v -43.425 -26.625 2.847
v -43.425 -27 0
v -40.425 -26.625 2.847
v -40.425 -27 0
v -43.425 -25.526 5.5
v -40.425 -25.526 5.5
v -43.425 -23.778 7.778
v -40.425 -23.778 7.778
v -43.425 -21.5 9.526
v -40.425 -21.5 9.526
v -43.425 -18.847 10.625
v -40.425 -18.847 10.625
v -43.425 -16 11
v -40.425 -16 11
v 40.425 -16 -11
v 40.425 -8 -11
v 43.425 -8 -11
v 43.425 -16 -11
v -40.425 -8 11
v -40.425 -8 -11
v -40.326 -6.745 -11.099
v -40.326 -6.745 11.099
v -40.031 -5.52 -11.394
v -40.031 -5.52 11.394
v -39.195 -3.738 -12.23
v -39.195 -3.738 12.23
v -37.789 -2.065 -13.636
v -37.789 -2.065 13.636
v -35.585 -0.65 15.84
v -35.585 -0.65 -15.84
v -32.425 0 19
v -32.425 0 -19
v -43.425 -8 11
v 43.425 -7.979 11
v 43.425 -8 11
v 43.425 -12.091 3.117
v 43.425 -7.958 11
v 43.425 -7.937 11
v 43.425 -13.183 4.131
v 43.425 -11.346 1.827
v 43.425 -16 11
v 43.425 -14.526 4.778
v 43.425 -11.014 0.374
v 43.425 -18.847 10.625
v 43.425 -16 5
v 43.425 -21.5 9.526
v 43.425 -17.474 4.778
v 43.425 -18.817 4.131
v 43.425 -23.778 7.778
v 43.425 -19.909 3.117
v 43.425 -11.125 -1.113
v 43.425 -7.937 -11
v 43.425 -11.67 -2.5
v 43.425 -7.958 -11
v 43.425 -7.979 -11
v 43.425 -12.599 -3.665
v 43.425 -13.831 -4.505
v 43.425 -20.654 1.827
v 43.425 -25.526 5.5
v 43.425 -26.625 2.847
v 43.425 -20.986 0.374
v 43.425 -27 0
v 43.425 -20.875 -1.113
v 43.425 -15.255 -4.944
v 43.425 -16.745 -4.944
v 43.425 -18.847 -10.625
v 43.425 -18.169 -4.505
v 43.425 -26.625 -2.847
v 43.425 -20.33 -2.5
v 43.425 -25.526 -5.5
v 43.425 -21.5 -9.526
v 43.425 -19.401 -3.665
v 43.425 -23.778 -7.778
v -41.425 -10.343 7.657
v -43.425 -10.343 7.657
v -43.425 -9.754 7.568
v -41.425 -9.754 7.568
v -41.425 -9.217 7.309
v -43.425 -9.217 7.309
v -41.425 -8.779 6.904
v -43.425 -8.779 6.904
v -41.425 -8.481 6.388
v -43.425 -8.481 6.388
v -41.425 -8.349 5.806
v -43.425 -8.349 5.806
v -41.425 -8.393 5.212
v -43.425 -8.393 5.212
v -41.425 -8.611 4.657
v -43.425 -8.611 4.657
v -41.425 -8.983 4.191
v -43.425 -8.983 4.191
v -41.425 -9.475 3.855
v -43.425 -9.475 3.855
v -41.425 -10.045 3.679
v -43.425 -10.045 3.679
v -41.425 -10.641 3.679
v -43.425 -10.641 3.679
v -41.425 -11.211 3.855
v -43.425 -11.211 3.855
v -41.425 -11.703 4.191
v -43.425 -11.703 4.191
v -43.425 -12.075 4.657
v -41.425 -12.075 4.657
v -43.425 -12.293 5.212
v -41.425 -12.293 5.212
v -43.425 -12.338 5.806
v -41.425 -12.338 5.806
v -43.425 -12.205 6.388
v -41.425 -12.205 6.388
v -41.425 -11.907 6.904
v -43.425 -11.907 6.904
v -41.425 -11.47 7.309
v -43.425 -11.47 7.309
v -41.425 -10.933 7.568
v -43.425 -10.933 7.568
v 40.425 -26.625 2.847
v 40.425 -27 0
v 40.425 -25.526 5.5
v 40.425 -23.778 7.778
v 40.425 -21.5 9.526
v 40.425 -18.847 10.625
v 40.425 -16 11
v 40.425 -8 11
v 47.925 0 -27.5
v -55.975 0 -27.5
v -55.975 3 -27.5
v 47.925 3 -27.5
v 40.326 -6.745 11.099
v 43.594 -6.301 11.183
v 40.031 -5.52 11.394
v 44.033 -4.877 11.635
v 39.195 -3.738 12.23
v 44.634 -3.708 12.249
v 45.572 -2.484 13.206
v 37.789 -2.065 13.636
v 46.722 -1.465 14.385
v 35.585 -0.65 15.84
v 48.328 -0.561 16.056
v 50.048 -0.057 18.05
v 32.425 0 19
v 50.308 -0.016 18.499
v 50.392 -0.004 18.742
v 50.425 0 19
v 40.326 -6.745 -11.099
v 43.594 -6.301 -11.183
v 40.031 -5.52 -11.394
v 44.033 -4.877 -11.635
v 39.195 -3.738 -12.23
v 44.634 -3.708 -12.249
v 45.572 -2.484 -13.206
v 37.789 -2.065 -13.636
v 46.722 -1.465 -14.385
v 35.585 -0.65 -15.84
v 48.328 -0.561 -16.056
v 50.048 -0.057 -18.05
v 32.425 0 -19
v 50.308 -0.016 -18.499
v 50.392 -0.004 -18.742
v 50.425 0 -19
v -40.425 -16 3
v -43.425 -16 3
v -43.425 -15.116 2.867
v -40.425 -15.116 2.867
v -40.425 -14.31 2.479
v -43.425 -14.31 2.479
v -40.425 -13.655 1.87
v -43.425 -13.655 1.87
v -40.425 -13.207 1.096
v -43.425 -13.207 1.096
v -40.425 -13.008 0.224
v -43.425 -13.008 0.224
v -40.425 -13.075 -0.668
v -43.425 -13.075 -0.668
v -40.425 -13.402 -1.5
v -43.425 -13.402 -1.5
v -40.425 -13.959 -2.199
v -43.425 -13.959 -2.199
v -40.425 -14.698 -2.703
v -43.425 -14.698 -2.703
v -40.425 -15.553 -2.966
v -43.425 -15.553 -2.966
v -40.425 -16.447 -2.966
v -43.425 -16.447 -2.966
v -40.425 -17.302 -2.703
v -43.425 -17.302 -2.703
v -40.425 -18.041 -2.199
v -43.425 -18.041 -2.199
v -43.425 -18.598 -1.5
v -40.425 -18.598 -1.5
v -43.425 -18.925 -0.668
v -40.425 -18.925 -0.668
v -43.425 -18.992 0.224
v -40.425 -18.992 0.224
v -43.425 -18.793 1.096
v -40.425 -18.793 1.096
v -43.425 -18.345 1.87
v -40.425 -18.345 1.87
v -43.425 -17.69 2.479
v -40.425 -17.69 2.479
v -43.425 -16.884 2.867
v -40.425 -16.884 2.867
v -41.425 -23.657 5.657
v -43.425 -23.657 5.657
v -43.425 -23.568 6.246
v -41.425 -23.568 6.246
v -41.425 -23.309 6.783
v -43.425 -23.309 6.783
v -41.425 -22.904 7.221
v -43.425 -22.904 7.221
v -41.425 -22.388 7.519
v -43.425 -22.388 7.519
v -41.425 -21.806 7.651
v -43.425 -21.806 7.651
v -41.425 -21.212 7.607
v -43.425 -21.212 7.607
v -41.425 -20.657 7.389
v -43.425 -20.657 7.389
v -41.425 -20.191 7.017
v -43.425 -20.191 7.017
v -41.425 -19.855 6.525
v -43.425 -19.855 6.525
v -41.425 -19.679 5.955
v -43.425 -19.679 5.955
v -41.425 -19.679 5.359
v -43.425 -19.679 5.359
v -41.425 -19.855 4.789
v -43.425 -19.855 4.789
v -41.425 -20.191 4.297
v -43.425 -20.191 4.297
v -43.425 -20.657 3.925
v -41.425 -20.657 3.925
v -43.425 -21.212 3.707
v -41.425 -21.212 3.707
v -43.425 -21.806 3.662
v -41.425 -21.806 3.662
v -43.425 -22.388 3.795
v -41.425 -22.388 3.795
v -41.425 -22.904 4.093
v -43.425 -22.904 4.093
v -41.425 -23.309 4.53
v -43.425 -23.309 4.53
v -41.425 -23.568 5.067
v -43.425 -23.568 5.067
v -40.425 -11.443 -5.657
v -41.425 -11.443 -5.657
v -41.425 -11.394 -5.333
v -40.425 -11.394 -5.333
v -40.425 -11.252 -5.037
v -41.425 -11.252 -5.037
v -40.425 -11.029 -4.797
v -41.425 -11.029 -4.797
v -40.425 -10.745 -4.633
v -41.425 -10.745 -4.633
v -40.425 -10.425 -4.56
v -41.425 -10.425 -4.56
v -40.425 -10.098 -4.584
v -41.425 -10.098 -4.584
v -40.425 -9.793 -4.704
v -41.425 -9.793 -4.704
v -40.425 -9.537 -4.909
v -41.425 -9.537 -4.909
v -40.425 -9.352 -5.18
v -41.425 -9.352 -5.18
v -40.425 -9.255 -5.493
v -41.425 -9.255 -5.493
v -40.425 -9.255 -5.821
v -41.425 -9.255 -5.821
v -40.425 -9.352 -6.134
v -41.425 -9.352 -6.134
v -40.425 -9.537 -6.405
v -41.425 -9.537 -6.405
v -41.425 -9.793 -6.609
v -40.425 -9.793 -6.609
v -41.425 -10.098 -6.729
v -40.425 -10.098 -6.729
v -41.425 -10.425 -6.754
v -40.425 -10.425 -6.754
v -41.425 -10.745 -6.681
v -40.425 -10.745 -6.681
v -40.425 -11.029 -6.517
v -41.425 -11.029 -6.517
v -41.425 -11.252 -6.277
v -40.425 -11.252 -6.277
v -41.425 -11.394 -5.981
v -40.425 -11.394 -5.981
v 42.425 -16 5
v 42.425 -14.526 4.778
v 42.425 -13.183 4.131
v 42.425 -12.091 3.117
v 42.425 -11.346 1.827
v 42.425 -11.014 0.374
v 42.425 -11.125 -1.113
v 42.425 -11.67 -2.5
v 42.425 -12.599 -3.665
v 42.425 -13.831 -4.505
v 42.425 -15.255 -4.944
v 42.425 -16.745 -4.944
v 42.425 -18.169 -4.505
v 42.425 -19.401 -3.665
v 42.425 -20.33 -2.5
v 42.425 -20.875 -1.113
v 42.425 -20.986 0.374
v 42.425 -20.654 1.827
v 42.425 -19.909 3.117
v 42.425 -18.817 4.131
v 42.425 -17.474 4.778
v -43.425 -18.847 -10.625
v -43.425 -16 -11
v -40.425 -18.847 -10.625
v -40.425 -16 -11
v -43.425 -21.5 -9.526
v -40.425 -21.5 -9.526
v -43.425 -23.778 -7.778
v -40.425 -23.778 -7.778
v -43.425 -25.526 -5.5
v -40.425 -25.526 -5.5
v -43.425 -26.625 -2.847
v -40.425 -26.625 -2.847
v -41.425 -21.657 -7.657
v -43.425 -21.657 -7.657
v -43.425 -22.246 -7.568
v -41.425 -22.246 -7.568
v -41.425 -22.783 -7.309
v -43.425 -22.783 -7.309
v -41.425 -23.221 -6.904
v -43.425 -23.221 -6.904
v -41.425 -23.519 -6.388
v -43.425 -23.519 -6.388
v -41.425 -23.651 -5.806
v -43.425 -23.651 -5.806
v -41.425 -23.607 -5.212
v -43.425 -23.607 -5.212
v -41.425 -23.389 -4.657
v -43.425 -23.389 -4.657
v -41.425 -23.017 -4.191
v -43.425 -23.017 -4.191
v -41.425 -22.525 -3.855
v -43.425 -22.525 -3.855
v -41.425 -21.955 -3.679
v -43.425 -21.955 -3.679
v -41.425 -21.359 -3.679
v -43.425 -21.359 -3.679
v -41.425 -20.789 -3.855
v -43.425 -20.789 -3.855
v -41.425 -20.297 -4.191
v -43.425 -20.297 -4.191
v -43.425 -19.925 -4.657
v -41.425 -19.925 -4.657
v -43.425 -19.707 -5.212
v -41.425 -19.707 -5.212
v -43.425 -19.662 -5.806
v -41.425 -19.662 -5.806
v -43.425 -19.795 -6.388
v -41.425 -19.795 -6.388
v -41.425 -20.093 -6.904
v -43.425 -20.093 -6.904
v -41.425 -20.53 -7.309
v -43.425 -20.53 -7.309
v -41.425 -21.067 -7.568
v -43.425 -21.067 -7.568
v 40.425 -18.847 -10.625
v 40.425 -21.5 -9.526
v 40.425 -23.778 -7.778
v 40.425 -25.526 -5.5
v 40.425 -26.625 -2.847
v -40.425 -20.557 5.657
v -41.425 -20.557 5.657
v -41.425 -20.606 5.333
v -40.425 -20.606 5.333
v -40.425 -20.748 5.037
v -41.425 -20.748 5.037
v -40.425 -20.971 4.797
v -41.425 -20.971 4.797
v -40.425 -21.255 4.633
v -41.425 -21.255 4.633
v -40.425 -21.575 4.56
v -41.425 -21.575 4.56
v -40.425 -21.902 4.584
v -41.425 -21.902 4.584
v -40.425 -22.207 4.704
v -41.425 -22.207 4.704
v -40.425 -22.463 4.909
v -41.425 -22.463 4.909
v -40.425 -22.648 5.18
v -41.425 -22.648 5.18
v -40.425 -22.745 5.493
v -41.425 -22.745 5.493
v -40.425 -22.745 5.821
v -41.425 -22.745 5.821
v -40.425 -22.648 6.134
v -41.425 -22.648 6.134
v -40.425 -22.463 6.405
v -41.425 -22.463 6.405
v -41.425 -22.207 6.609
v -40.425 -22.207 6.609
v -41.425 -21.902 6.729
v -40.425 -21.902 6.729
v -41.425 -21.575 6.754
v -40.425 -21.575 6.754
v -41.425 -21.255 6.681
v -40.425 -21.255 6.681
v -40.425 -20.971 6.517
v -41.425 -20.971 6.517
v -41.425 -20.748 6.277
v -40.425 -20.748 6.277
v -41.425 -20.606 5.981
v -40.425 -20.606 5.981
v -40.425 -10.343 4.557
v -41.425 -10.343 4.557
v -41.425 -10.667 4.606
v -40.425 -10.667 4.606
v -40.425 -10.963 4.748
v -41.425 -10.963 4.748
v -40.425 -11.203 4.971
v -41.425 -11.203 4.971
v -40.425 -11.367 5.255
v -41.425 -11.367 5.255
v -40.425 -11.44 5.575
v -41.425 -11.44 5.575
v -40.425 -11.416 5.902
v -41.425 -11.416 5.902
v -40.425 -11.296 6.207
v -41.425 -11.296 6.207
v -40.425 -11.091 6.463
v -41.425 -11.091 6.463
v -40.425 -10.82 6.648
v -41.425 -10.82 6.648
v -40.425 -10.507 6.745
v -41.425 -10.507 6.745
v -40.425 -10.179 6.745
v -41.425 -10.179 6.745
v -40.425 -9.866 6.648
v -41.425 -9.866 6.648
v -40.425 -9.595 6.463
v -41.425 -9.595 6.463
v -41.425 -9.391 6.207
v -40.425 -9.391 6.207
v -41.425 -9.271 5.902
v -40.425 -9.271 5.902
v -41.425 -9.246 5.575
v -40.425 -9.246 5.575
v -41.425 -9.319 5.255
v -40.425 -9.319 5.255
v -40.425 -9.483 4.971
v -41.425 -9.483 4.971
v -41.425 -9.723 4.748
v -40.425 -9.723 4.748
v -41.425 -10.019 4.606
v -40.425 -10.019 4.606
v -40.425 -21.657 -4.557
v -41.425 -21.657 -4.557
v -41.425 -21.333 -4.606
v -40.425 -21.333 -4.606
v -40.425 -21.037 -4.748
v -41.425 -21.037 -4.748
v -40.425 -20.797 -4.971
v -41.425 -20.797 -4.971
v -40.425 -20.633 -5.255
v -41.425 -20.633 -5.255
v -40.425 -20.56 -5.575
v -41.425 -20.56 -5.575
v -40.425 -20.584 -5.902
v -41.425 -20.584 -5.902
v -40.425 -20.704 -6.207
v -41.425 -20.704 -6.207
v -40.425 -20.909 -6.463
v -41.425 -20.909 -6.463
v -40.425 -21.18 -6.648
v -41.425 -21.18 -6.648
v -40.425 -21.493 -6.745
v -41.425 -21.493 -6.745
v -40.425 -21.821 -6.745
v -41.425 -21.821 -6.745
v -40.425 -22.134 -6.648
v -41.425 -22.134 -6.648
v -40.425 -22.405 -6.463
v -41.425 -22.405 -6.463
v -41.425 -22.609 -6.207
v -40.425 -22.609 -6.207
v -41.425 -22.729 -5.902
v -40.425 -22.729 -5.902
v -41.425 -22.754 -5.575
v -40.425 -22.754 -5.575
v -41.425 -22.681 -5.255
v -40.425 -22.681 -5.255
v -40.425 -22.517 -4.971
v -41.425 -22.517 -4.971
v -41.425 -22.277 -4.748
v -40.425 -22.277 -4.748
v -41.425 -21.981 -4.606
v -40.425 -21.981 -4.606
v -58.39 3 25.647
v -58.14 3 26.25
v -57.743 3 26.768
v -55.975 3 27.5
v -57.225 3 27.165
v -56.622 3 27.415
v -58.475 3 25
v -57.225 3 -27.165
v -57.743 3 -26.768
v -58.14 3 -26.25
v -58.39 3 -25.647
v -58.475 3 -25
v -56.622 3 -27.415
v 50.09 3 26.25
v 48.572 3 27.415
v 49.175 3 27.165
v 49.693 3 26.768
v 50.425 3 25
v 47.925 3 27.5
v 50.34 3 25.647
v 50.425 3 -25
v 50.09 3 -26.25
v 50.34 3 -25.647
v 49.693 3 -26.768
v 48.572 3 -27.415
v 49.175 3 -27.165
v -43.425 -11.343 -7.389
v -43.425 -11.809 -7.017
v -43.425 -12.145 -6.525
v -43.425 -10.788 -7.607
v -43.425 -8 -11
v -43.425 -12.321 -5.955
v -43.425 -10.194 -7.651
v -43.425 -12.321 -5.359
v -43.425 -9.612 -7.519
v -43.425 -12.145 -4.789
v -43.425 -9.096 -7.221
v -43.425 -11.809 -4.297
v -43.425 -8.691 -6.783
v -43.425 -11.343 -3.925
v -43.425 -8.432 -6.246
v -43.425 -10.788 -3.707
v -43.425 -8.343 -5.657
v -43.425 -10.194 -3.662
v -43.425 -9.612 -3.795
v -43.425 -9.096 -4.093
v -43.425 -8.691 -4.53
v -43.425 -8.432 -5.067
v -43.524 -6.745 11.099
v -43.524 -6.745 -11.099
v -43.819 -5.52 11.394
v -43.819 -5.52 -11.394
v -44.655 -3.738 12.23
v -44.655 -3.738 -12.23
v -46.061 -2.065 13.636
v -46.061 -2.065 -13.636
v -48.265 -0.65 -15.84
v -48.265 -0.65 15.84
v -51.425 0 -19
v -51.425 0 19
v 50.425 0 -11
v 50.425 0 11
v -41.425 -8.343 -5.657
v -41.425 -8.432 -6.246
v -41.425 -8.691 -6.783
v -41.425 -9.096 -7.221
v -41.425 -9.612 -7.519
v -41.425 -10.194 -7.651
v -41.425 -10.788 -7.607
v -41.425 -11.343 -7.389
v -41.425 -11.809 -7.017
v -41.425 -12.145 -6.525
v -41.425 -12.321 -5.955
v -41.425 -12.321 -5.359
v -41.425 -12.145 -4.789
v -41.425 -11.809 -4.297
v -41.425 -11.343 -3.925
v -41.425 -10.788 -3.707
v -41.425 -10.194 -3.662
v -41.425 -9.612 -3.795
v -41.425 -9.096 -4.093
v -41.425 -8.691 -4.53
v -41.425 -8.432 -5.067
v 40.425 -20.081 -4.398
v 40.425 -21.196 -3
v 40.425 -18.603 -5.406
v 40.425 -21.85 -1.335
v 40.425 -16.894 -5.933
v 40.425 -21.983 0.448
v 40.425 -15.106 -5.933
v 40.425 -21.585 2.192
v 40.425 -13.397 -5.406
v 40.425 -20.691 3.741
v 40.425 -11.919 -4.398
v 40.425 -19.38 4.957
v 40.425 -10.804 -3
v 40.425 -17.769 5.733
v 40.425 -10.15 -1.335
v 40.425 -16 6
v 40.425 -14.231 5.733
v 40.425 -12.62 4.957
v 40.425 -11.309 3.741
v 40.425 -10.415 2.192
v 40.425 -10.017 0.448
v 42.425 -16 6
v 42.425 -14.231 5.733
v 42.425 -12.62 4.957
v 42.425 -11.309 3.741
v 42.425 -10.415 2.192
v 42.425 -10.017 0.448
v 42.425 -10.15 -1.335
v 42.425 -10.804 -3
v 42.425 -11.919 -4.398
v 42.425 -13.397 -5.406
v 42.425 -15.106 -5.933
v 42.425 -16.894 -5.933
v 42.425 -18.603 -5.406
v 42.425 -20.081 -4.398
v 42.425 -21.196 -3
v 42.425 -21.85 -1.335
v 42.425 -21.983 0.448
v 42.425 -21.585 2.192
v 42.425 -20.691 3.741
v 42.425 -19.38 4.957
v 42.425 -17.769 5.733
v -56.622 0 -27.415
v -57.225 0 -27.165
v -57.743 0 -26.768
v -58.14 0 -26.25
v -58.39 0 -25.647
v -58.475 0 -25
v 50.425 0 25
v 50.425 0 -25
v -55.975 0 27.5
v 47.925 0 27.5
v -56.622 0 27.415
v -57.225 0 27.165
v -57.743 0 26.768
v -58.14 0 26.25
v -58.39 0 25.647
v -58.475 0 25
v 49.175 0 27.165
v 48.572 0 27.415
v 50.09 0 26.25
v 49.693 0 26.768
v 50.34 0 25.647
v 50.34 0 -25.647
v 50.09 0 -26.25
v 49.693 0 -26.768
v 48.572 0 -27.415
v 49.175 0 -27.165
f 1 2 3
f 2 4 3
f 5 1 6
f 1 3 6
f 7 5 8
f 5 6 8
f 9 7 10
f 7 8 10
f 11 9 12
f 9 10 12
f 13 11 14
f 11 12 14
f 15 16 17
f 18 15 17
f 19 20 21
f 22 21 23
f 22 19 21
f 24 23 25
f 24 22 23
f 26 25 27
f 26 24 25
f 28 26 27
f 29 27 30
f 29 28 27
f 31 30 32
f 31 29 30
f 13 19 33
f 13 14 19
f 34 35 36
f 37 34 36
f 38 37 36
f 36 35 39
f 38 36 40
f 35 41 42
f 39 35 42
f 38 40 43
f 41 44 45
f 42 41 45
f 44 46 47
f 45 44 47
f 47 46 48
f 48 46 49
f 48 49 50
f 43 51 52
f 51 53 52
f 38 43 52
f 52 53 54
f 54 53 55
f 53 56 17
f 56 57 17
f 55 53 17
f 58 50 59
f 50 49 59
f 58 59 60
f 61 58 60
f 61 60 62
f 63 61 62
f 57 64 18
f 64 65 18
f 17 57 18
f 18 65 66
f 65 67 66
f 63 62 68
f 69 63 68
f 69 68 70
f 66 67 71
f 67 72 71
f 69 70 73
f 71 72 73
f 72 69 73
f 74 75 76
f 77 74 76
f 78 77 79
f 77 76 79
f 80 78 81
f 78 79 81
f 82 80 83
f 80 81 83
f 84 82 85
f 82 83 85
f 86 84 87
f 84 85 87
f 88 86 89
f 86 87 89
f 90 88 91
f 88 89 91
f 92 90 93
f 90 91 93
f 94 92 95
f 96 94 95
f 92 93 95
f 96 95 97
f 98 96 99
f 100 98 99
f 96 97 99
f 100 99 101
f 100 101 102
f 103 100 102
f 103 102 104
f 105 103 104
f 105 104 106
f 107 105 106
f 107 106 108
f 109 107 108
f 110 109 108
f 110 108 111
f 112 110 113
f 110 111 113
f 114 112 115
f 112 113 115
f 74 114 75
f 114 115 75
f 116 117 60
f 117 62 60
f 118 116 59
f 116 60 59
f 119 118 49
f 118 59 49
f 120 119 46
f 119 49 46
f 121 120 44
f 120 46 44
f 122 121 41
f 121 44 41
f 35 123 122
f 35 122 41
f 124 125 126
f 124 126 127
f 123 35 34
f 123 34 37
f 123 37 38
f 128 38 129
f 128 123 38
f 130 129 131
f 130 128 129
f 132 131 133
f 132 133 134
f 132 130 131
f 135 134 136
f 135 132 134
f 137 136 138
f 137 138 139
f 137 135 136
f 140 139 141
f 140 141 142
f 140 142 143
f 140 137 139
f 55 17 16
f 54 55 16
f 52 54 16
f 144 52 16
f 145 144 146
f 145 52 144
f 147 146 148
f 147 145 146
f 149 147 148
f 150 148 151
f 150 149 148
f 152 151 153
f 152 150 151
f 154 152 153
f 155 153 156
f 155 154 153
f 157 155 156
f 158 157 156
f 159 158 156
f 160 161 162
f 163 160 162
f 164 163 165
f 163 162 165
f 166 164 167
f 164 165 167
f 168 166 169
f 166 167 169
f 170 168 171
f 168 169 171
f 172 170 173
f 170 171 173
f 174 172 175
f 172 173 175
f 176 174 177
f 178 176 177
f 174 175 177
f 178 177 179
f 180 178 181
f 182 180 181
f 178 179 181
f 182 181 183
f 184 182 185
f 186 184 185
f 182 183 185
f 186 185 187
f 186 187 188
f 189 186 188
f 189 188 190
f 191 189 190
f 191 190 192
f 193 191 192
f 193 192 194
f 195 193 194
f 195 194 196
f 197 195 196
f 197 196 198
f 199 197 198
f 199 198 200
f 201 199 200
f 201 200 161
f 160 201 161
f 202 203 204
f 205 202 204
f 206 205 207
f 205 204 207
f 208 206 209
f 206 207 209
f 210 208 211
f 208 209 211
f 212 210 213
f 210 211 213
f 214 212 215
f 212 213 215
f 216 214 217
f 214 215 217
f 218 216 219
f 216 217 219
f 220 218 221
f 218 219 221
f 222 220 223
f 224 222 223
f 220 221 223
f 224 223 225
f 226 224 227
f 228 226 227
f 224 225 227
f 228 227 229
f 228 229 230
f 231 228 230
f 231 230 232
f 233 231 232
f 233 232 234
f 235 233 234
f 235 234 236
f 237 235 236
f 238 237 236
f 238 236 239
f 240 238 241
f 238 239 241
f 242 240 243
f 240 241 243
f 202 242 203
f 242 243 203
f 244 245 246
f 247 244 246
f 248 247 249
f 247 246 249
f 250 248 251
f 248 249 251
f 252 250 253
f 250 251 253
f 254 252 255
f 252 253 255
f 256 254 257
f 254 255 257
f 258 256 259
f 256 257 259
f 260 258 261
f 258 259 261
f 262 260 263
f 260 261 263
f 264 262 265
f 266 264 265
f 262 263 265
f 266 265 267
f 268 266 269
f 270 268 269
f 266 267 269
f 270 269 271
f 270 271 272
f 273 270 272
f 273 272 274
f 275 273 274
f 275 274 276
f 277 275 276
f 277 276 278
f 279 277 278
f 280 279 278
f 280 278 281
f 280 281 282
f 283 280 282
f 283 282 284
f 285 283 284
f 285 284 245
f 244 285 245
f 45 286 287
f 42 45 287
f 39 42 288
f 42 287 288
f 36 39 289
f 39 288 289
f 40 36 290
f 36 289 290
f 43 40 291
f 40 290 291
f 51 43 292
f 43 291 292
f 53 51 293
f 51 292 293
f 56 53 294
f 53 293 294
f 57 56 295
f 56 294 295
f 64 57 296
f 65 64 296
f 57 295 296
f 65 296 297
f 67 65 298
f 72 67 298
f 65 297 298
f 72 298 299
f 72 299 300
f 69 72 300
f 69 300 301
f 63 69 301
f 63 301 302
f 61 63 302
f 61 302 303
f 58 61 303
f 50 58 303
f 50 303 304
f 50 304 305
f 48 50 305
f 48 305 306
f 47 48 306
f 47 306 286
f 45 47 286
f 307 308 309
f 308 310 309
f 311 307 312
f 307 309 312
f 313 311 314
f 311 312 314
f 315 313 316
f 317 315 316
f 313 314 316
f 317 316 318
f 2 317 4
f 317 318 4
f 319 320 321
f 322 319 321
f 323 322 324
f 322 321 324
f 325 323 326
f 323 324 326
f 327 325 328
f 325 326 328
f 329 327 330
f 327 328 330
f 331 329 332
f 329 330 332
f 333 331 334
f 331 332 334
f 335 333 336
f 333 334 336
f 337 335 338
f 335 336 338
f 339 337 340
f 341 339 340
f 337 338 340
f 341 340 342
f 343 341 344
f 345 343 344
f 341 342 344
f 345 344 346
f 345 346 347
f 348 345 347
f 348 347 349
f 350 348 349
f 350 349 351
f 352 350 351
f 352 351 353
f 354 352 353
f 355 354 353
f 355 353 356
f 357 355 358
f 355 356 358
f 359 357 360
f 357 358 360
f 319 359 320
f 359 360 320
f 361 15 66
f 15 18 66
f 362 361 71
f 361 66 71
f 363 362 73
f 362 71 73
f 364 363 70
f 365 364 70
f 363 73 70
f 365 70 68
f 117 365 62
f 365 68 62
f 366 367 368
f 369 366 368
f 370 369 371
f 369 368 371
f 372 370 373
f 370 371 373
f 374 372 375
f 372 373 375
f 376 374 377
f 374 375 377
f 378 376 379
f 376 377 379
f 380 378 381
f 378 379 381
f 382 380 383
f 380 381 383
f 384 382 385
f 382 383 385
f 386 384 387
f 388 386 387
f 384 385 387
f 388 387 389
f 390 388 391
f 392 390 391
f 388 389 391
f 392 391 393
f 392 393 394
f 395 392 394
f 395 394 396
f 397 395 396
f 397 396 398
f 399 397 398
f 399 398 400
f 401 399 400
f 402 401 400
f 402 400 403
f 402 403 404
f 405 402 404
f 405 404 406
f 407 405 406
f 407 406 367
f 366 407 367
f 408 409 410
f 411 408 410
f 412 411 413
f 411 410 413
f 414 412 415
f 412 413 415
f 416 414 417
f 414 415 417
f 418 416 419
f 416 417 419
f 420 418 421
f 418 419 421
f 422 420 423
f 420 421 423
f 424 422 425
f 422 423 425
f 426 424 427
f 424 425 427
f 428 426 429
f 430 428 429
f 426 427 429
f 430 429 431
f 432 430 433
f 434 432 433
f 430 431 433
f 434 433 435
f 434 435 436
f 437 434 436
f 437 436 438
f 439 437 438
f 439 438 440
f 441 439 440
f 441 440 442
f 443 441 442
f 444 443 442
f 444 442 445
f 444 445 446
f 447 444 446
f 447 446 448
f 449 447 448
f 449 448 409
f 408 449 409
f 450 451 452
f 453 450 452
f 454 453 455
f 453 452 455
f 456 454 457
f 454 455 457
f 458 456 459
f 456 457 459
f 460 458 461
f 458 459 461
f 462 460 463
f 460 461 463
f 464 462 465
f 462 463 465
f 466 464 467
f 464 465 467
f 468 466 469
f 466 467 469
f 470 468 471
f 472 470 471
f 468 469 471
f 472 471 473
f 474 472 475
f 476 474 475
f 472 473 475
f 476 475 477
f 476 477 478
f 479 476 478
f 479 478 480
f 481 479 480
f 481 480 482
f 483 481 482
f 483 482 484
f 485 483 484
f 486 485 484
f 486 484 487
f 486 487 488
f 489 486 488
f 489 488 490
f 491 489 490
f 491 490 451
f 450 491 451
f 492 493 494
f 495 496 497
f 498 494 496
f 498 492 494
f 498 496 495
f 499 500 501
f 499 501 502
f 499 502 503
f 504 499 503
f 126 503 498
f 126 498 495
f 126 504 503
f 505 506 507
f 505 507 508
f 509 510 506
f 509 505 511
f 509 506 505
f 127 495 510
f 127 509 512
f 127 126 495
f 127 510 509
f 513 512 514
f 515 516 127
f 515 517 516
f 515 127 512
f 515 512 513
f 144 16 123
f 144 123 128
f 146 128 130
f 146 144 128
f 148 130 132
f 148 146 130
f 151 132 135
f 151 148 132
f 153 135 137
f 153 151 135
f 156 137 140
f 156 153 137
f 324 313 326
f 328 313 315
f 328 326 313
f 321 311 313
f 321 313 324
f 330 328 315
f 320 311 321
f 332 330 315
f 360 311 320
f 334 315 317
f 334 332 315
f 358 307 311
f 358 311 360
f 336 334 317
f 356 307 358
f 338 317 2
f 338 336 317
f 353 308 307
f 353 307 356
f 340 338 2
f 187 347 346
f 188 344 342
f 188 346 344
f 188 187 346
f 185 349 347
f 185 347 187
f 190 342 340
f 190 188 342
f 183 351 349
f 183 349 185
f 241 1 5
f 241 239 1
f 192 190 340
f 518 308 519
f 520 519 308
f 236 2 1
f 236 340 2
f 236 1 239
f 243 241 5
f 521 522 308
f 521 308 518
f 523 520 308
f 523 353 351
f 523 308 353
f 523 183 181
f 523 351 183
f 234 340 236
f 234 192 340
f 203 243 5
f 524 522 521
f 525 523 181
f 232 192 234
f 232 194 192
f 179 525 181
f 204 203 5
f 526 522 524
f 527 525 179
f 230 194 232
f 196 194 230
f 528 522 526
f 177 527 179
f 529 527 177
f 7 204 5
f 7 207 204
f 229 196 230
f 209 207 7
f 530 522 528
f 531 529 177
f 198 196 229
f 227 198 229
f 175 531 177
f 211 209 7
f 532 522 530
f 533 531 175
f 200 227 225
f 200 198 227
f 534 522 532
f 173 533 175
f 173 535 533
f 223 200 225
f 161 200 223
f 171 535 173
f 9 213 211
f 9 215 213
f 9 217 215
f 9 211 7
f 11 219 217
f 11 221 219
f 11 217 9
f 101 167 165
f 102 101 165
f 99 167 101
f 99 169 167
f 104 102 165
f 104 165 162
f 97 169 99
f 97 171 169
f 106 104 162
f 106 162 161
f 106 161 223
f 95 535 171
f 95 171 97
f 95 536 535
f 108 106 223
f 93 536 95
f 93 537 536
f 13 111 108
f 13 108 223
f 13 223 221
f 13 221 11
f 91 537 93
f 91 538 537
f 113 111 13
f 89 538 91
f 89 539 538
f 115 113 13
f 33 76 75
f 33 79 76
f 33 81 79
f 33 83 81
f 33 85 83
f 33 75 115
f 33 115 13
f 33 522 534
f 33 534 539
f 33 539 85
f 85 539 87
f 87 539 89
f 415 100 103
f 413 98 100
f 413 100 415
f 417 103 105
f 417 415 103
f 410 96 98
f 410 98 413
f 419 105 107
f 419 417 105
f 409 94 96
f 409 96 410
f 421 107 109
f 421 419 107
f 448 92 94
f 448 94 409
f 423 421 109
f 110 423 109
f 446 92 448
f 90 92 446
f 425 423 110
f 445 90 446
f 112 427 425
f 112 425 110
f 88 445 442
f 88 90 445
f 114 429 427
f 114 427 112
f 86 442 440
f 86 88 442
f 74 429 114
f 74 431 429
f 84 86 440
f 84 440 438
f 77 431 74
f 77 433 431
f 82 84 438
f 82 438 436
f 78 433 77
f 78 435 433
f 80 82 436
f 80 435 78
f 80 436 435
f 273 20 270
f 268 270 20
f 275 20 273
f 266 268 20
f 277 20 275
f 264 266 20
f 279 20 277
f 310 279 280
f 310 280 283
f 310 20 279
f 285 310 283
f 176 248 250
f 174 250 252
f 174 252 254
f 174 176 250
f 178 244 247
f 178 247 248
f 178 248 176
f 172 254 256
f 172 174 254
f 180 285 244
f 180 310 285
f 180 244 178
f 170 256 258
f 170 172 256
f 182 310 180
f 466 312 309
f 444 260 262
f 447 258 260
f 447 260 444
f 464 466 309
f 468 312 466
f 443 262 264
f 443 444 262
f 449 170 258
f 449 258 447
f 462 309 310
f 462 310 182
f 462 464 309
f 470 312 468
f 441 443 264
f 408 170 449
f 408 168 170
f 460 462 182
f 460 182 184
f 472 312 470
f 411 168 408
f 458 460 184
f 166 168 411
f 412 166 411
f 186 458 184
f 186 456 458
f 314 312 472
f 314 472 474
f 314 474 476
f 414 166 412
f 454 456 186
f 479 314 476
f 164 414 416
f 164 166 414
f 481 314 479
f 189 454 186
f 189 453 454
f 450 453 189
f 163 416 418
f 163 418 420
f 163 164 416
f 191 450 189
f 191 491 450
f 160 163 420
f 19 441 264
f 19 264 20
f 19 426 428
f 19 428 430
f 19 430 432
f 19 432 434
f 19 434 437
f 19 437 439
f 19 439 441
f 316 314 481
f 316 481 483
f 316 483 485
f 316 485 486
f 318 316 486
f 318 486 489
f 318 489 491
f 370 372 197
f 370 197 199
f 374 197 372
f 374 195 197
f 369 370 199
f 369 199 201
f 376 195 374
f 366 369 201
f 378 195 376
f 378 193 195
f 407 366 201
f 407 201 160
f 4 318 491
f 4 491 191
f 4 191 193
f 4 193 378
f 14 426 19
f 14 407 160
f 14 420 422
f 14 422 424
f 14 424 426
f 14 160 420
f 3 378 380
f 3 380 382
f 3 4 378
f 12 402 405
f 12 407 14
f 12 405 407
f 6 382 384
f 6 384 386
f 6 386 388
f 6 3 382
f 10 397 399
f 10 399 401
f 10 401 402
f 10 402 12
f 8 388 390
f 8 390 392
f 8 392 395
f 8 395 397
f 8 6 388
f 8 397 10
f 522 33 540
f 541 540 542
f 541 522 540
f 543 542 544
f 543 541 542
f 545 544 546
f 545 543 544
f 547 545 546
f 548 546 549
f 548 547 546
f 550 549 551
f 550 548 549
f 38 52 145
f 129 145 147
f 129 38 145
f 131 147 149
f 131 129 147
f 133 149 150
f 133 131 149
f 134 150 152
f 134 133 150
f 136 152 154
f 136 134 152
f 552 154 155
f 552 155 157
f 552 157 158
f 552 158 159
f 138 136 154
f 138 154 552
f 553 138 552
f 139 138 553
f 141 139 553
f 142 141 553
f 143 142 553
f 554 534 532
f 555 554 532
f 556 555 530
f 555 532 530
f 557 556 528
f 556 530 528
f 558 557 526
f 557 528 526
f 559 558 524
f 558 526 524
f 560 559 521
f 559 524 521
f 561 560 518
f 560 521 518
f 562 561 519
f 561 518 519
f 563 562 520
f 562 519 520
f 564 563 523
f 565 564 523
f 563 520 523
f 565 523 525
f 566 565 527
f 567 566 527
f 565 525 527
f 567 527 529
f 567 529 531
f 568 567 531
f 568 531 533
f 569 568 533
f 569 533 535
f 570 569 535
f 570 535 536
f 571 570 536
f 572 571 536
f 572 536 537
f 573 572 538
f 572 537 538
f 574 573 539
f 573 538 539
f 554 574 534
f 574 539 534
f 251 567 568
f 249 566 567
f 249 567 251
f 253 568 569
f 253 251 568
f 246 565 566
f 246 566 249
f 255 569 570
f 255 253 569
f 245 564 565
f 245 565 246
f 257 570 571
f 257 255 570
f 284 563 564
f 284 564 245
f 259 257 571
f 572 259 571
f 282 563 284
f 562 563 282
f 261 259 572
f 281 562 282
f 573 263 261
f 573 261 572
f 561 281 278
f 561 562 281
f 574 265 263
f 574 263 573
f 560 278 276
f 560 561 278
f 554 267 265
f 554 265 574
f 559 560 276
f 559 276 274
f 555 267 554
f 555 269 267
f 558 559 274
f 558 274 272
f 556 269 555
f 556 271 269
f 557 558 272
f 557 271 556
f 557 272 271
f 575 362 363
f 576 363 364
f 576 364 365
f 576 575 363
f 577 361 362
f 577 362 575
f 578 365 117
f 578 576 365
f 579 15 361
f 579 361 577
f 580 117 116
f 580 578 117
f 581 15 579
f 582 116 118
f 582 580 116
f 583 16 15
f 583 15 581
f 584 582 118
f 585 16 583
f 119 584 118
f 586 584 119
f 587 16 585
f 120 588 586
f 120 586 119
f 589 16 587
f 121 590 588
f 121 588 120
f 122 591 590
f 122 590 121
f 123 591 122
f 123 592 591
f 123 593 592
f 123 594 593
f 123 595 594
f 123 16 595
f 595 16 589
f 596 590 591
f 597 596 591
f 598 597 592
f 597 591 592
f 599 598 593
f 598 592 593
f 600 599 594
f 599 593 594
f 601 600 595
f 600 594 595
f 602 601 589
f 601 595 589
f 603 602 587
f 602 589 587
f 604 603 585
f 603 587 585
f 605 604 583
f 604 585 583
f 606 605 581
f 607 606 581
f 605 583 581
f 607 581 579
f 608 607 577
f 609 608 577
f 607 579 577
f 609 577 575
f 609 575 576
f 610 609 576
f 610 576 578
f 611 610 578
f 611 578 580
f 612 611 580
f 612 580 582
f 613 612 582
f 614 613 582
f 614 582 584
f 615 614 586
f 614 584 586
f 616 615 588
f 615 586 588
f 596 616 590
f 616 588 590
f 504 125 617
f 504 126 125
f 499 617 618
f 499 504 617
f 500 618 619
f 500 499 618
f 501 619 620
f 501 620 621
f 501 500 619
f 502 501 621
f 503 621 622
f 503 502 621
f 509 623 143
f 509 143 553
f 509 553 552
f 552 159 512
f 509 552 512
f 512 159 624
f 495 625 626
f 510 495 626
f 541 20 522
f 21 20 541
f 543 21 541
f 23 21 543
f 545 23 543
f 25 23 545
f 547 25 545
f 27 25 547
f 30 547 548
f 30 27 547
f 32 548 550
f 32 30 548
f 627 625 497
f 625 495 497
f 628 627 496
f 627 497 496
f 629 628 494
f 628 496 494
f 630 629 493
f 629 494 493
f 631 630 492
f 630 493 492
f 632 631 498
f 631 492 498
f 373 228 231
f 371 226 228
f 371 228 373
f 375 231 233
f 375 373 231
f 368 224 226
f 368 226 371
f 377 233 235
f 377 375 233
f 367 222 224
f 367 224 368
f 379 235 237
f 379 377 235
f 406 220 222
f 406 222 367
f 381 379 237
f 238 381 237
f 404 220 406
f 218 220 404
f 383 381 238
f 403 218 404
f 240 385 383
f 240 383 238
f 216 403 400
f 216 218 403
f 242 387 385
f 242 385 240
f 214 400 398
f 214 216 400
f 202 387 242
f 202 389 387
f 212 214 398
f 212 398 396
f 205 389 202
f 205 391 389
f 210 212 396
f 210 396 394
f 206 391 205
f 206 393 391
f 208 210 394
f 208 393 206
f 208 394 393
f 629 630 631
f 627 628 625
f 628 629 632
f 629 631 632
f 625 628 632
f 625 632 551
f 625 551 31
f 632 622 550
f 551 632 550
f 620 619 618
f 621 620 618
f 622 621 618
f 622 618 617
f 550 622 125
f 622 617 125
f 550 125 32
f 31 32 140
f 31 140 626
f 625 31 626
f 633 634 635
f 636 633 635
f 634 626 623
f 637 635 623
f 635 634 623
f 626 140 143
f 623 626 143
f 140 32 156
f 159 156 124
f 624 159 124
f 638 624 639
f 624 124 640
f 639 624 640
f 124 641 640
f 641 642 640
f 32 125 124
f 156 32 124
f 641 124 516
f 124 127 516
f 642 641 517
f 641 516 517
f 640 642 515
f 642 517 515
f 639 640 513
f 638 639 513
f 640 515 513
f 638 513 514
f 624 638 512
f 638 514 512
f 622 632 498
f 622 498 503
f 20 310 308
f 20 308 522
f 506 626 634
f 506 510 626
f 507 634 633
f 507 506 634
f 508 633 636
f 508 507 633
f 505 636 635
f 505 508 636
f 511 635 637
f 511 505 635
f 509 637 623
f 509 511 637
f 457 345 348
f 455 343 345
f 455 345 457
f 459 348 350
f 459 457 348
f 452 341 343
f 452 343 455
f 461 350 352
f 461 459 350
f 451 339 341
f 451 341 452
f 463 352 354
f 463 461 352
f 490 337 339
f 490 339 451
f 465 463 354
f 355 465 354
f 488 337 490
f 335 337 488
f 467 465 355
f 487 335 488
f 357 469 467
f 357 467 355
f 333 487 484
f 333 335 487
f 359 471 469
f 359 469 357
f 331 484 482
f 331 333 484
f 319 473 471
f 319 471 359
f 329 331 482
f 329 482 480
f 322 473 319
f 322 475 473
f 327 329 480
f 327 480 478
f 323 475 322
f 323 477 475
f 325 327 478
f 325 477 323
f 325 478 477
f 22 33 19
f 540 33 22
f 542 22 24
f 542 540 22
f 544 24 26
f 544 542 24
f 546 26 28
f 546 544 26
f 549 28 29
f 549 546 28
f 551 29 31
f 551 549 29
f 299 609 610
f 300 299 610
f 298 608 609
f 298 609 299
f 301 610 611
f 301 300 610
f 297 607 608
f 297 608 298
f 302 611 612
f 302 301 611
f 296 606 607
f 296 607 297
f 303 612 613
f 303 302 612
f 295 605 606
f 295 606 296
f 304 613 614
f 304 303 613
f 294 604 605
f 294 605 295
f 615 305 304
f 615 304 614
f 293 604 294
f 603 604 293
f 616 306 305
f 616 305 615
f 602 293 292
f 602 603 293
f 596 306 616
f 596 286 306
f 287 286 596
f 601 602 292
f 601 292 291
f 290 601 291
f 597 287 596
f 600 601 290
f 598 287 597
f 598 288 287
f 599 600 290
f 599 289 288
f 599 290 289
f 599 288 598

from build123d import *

# Parameters (mm, degrees)
SKETCH1_W           = 108.9
SKETCH1_H           = 55
BOSS_EXTRUDE1_DEPTH = 3
SKETCH5_W           = 3
SKETCH5_H           = 22
BOSS_EXTRUDE2_DEPTH = 27
SKETCH2_R           = 3
SKETCH2_R_2         = 1.1
CUT_EXTRUDE1_DEPTH  = 3
CIRPATTERN1_COUNT   = 4
FILLET3_R           = 11
SKETCH6_R           = 2
CUT_EXTRUDE5_DEPTH  = 2
CIRPATTERN2_COUNT   = 4
SKETCH7_R           = 5
CUT_EXTRUDE6_DEPTH  = 10
SKETCH7_5_R         = 6
SKETCH7_5_R_2       = 5
CUT_EXTRUDE7_DEPTH  = 2
FILLET4_R           = 8
FILETE1_R           = 2.5


# Some blends are built 0.0001 mm under size
with BuildPart() as part:
    # Sketch1 → Boss-Extrude1 (new body)
    with BuildSketch(Plane(origin=(0, 0, 0), x_dir=(1, 0, 0), z_dir=(0, 1, 0))):
        with Locations((-4.025, 0)):
            Rectangle(SKETCH1_W, SKETCH1_H)
    extrude(amount=BOSS_EXTRUDE1_DEPTH)

    # Sketch5 → Boss-Extrude2 (add)
    with BuildSketch(Plane.XZ):
        with Locations((-41.925, 0)):
            Rectangle(SKETCH5_W, SKETCH5_H)
        with Locations((41.925, 0)):
            Rectangle(SKETCH5_W, SKETCH5_H)
    extrude(amount=BOSS_EXTRUDE2_DEPTH)

    # Sketch2 → Cut-Extrude1 (cut)
    with BuildSketch(Plane.ZY.offset(43.425)):
        with Locations((0, -16)):
            Circle(SKETCH2_R)
        with Locations((-5.656854249, -21.656854249)):
            Circle(SKETCH2_R_2)
    cut_extrude1 = extrude(amount=-CUT_EXTRUDE1_DEPTH, mode=Mode.SUBTRACT)

    # CirPattern1: Cut-Extrude1 ×4 about axis
    cirpattern1_axis = Axis((0, -16, 0), (1, 0, 0))
    for i in range(1, CIRPATTERN1_COUNT):
        add(cut_extrude1.rotate(cirpattern1_axis, i * 360 / CIRPATTERN1_COUNT), mode=Mode.SUBTRACT)

    # Fillet3
    fillet3_edges = [part.edges().sort_by_distance(p)[0] for p in [
        (-41.925, -27, -11),
        (-41.925, -27, 11),
        (41.925, -27, -11),
        (41.925, -27, 11),
    ]]
    fillet(fillet3_edges, radius=FILLET3_R - 0.0001)  # a hair under: the kernel refuses the full size

    # Sketch6 → Cut-Extrude5 (cut)
    with BuildSketch(Plane.ZY.offset(43.425)):
        with Locations((5.656854249, -10.343145751)):
            Circle(SKETCH6_R)
    cut_extrude5 = extrude(amount=-CUT_EXTRUDE5_DEPTH, mode=Mode.SUBTRACT)

    # CirPattern2: Cut-Extrude5 ×4 about axis
    cirpattern2_axis = Axis((0, -16, 0), (1, 0, 0))
    for i in range(1, CIRPATTERN2_COUNT):
        add(cut_extrude5.rotate(cirpattern2_axis, i * 360 / CIRPATTERN2_COUNT), mode=Mode.SUBTRACT)

    # Sketch7 → Cut-Extrude6 (cut)
    with BuildSketch(Plane.ZY.offset(-40.425)):
        with Locations((0, -16)):
            Circle(SKETCH7_R)
    extrude(amount=-CUT_EXTRUDE6_DEPTH, mode=Mode.SUBTRACT)

    # Sketch7<5> → Cut-Extrude7 (cut)
    with BuildSketch(Plane.ZY.offset(-40.425)):
        with Locations((0, -16)):
            Circle(SKETCH7_5_R)
        with Locations((0, -16)):
            Circle(SKETCH7_5_R_2, mode=Mode.SUBTRACT)
    extrude(amount=-CUT_EXTRUDE7_DEPTH, mode=Mode.SUBTRACT)

    # Fillet4
    # the kernel refuses this fillet: 8 mm, written as the material it adds along each edge
    with BuildSketch(Plane(origin=(-43.425, 0, -11), x_dir=(0, -1, 0), z_dir=(0, 0, 1))) as fillet4_piece_1:
        with BuildLine():
            CenterArc((FILLET4_R, -FILLET4_R), FILLET4_R, 90, 90)
            Line((0, -FILLET4_R), (-FILLET4_R * 0.02, -FILLET4_R))
            Line((-FILLET4_R * 0.02, -FILLET4_R), (-FILLET4_R * 0.02, FILLET4_R * 0.02))
            Line((-FILLET4_R * 0.02, FILLET4_R * 0.02), (FILLET4_R, FILLET4_R * 0.02))
            Line((FILLET4_R, FILLET4_R * 0.02), (FILLET4_R, 0))
        make_face()
    extrude(amount=22)
    with BuildSketch(Plane(origin=(-40.425, 0, -11), x_dir=(0, 0, -1), z_dir=(-1, 0, 0)), Plane(origin=(43.425, 0, -11), x_dir=(0, 0, -1), z_dir=(-1, 0, 0)), Plane(origin=(40.425, 0, 11), x_dir=(0, 0, 1), z_dir=(1, 0, 0))) as fillet4_piece_2:
        with BuildLine():
            CenterArc((FILLET4_R, FILLET4_R), FILLET4_R, 180, 90)
            Line((0, FILLET4_R), (-FILLET4_R * 0.02, FILLET4_R))
            Line((-FILLET4_R * 0.02, FILLET4_R), (-FILLET4_R * 0.02, -FILLET4_R * 0.02))
            Line((-FILLET4_R * 0.02, -FILLET4_R * 0.02), (FILLET4_R, -FILLET4_R * 0.02))
            Line((FILLET4_R, -FILLET4_R * 0.02), (FILLET4_R, 0))
        make_face()
    extrude(amount=3)
    with BuildSketch(Plane(origin=(-40.425, 0, 11), x_dir=(1, 0, 0), z_dir=(0, 0, -1)), Plane(origin=(40.425, 0, -11), x_dir=(-1, 0, 0), z_dir=(0, 0, 1))) as fillet4_piece_3:
        with BuildLine():
            CenterArc((FILLET4_R, FILLET4_R), FILLET4_R, 180, 90)
            Line((0, FILLET4_R), (-FILLET4_R * 0.02, FILLET4_R))
            Line((-FILLET4_R * 0.02, FILLET4_R), (-FILLET4_R * 0.02, -FILLET4_R * 0.02))
            Line((-FILLET4_R * 0.02, -FILLET4_R * 0.02), (FILLET4_R, -FILLET4_R * 0.02))
            Line((FILLET4_R, -FILLET4_R * 0.02), (FILLET4_R, 0))
        make_face()
    extrude(amount=22)
    with BuildSketch(Plane(origin=(-43.425, 0, 11), x_dir=(0, -1, 0), z_dir=(1, 0, 0))) as fillet4_piece_4:
        with BuildLine():
            CenterArc((FILLET4_R, -FILLET4_R), FILLET4_R, 90, 90)
            Line((0, -FILLET4_R), (-FILLET4_R * 0.02, -FILLET4_R))
            Line((-FILLET4_R * 0.02, -FILLET4_R), (-FILLET4_R * 0.02, FILLET4_R * 0.02))
            Line((-FILLET4_R * 0.02, FILLET4_R * 0.02), (FILLET4_R, FILLET4_R * 0.02))
            Line((FILLET4_R, FILLET4_R * 0.02), (FILLET4_R, 0))
        make_face()
    extrude(amount=3)
    with BuildSketch(Plane(origin=(43.425, 0, 11), x_dir=(1, 0, 0), z_dir=(0, 0, -1))) as fillet4_piece_5:
        with BuildLine():
            CenterArc((8, 7.937253933), FILLET4_R, 180, 82.819244219)
            Line((0, 7.937253933), (-0.16, 7.937253933))
            Line((-0.16, 7.937253933), (-0.16, 0))
            Line((-0.16, 0), (0, -0.16))
            ThreePointArc((0, -0.16), (3.5, -0.16), (6.98, -0.158745079))
            Line((6.98, -0.158745079), (7, 0))
        make_face()
    extrude(amount=22)
    with BuildSketch(Plane(origin=(-43.425, 0, -31), x_dir=(0, -1, 0), z_dir=(0, 0, 1))) as fillet4_piece_6a_section:
        with BuildLine():
            CenterArc((FILLET4_R, -FILLET4_R), FILLET4_R, 90, 90)
            Line((0, -FILLET4_R), (-FILLET4_R * 0.02, -FILLET4_R))
            Line((-FILLET4_R * 0.02, -FILLET4_R), (-FILLET4_R * 0.02, FILLET4_R * 0.02))
            Line((-FILLET4_R * 0.02, FILLET4_R * 0.02), (FILLET4_R, FILLET4_R * 0.02))
            Line((FILLET4_R, FILLET4_R * 0.02), (FILLET4_R, 0))
        make_face()
    fillet4_piece_6a = extrude(amount=42, mode=Mode.PRIVATE)
    fillet4_piece_6a = split(fillet4_piece_6a, bisect_by=Plane(origin=(-45.236160914, -1.811160914, -11), z_dir=(0, 0, -1)), keep=Keep.TOP, mode=Mode.PRIVATE)
    fillet4_piece_6a = split(fillet4_piece_6a, bisect_by=Plane(origin=(-45.236160914, -1.811160914, -27.5), z_dir=(0, 0, 1)), keep=Keep.TOP, mode=Mode.PRIVATE)
    with BuildSketch(Plane(origin=(-40.425, 0, -11), x_dir=(0, 0, -1), z_dir=(-1, 0, 0))) as fillet4_piece_6b_section:
        with BuildLine():
            CenterArc((FILLET4_R, FILLET4_R), FILLET4_R, 180, 90)
            Line((0, FILLET4_R), (-FILLET4_R * 0.02, FILLET4_R))
            Line((-FILLET4_R * 0.02, FILLET4_R), (-FILLET4_R * 0.02, -FILLET4_R * 0.02))
            Line((-FILLET4_R * 0.02, -FILLET4_R * 0.02), (FILLET4_R, -FILLET4_R * 0.02))
            Line((FILLET4_R, -FILLET4_R * 0.02), (FILLET4_R, 0))
        make_face()
    fillet4_piece_6b = extrude(amount=23, mode=Mode.PRIVATE)
    fillet4_piece_6b = split(fillet4_piece_6b, bisect_by=Plane(origin=(-43.425, -1.811160914, -12.811160914), z_dir=(-1, 0, 0)), keep=Keep.TOP, mode=Mode.PRIVATE)
    fillet4_piece_6b = split(fillet4_piece_6b, bisect_by=Plane(origin=(-58.475, -1.811160914, -12.811160914), z_dir=(1, 0, 0)), keep=Keep.TOP, mode=Mode.PRIVATE)
    fillet4_piece_6 = fillet4_piece_6a & fillet4_piece_6b
    add(fillet4_piece_6)
    with BuildSketch(Plane(origin=(-63.425, 0, 11), x_dir=(0, -1, 0), z_dir=(1, 0, 0))) as fillet4_piece_7a_section:
        with BuildLine():
            CenterArc((FILLET4_R, -FILLET4_R), FILLET4_R, 90, 90)
            Line((0, -FILLET4_R), (-FILLET4_R * 0.02, -FILLET4_R))
            Line((-FILLET4_R * 0.02, -FILLET4_R), (-FILLET4_R * 0.02, FILLET4_R * 0.02))
            Line((-FILLET4_R * 0.02, FILLET4_R * 0.02), (FILLET4_R, FILLET4_R * 0.02))
            Line((FILLET4_R, FILLET4_R * 0.02), (FILLET4_R, 0))
        make_face()
    fillet4_piece_7a = extrude(amount=23, mode=Mode.PRIVATE)
    fillet4_piece_7a = split(fillet4_piece_7a, bisect_by=Plane(origin=(-43.425, -1.811160914, 12.811160914), z_dir=(-1, 0, 0)), keep=Keep.TOP, mode=Mode.PRIVATE)
    fillet4_piece_7a = split(fillet4_piece_7a, bisect_by=Plane(origin=(-58.475, -1.811160914, 12.811160914), z_dir=(1, 0, 0)), keep=Keep.TOP, mode=Mode.PRIVATE)
    with BuildSketch(Plane(origin=(-43.425, 0, -11), x_dir=(0, -1, 0), z_dir=(0, 0, 1))) as fillet4_piece_7b_section:
        with BuildLine():
            CenterArc((FILLET4_R, -FILLET4_R), FILLET4_R, 90, 90)
            Line((0, -FILLET4_R), (-FILLET4_R * 0.02, -FILLET4_R))
            Line((-FILLET4_R * 0.02, -FILLET4_R), (-FILLET4_R * 0.02, FILLET4_R * 0.02))
            Line((-FILLET4_R * 0.02, FILLET4_R * 0.02), (FILLET4_R, FILLET4_R * 0.02))
            Line((FILLET4_R, FILLET4_R * 0.02), (FILLET4_R, 0))
        make_face()
    fillet4_piece_7b = extrude(amount=42, mode=Mode.PRIVATE)
    fillet4_piece_7b = split(fillet4_piece_7b, bisect_by=Plane(origin=(-45.236160914, -1.811160914, 11), z_dir=(0, 0, 1)), keep=Keep.TOP, mode=Mode.PRIVATE)
    fillet4_piece_7b = split(fillet4_piece_7b, bisect_by=Plane(origin=(-45.236160914, -1.811160914, 27.5), z_dir=(0, 0, -1)), keep=Keep.TOP, mode=Mode.PRIVATE)
    fillet4_piece_7 = fillet4_piece_7a & fillet4_piece_7b
    add(fillet4_piece_7)
    with BuildSketch(Plane(origin=(-20.425, 0, -11), x_dir=(0, 0, -1), z_dir=(-1, 0, 0))) as fillet4_piece_8a_section:
        with BuildLine():
            CenterArc((FILLET4_R, FILLET4_R), FILLET4_R, 180, 90)
            Line((0, FILLET4_R), (-FILLET4_R * 0.02, FILLET4_R))
            Line((-FILLET4_R * 0.02, FILLET4_R), (-FILLET4_R * 0.02, -FILLET4_R * 0.02))
            Line((-FILLET4_R * 0.02, -FILLET4_R * 0.02), (FILLET4_R, -FILLET4_R * 0.02))
            Line((FILLET4_R, -FILLET4_R * 0.02), (FILLET4_R, 0))
        make_face()
    fillet4_piece_8a = extrude(amount=23, mode=Mode.PRIVATE)
    fillet4_piece_8a = split(fillet4_piece_8a, bisect_by=Plane(origin=(-40.425, -1.811160914, -12.811160914), z_dir=(1, 0, 0)), keep=Keep.TOP, mode=Mode.PRIVATE)
    with BuildSketch(Plane(origin=(-40.425, 0, 11), x_dir=(1, 0, 0), z_dir=(0, 0, -1))) as fillet4_piece_8b_section:
        with BuildLine():
            CenterArc((FILLET4_R, FILLET4_R), FILLET4_R, 180, 90)
            Line((0, FILLET4_R), (-FILLET4_R * 0.02, FILLET4_R))
            Line((-FILLET4_R * 0.02, FILLET4_R), (-FILLET4_R * 0.02, -FILLET4_R * 0.02))
            Line((-FILLET4_R * 0.02, -FILLET4_R * 0.02), (FILLET4_R, -FILLET4_R * 0.02))
            Line((FILLET4_R, -FILLET4_R * 0.02), (FILLET4_R, 0))
        make_face()
    fillet4_piece_8b = extrude(amount=42, mode=Mode.PRIVATE)
    fillet4_piece_8b = split(fillet4_piece_8b, bisect_by=Plane(origin=(-38.613839086, -1.811160914, -27.5), z_dir=(0, 0, 1)), keep=Keep.TOP, mode=Mode.PRIVATE)
    fillet4_piece_8b = split(fillet4_piece_8b, bisect_by=Plane(origin=(-38.613839086, -1.811160914, -11), z_dir=(0, 0, -1)), keep=Keep.TOP, mode=Mode.PRIVATE)
    fillet4_piece_8 = fillet4_piece_8a & fillet4_piece_8b
    add(fillet4_piece_8)
    with BuildSketch(Plane(origin=(-43.425, 0, 11), x_dir=(0, -1, 0), z_dir=(1, 0, 0))) as fillet4_piece_9a_section:
        with BuildLine():
            CenterArc((FILLET4_R, -FILLET4_R), FILLET4_R, 90, 90)
            Line((0, -FILLET4_R), (-FILLET4_R * 0.02, -FILLET4_R))
            Line((-FILLET4_R * 0.02, -FILLET4_R), (-FILLET4_R * 0.02, FILLET4_R * 0.02))
            Line((-FILLET4_R * 0.02, FILLET4_R * 0.02), (FILLET4_R, FILLET4_R * 0.02))
            Line((FILLET4_R, FILLET4_R * 0.02), (FILLET4_R, 0))
        make_face()
    fillet4_piece_9a = extrude(amount=23, mode=Mode.PRIVATE)
    fillet4_piece_9a = split(fillet4_piece_9a, bisect_by=Plane(origin=(-40.425, -1.811160914, 12.811160914), z_dir=(1, 0, 0)), keep=Keep.TOP, mode=Mode.PRIVATE)
    with BuildSketch(Plane(origin=(-40.425, 0, 31), x_dir=(1, 0, 0), z_dir=(0, 0, -1))) as fillet4_piece_9b_section:
        with BuildLine():
            CenterArc((FILLET4_R, FILLET4_R), FILLET4_R, 180, 90)
            Line((0, FILLET4_R), (-FILLET4_R * 0.02, FILLET4_R))
            Line((-FILLET4_R * 0.02, FILLET4_R), (-FILLET4_R * 0.02, -FILLET4_R * 0.02))
            Line((-FILLET4_R * 0.02, -FILLET4_R * 0.02), (FILLET4_R, -FILLET4_R * 0.02))
            Line((FILLET4_R, -FILLET4_R * 0.02), (FILLET4_R, 0))
        make_face()
    fillet4_piece_9b = extrude(amount=42, mode=Mode.PRIVATE)
    fillet4_piece_9b = split(fillet4_piece_9b, bisect_by=Plane(origin=(-38.613839086, -1.811160914, 11), z_dir=(0, 0, 1)), keep=Keep.TOP, mode=Mode.PRIVATE)
    fillet4_piece_9b = split(fillet4_piece_9b, bisect_by=Plane(origin=(-38.613839086, -1.811160914, 27.5), z_dir=(0, 0, -1)), keep=Keep.TOP, mode=Mode.PRIVATE)
    fillet4_piece_9 = fillet4_piece_9a & fillet4_piece_9b
    add(fillet4_piece_9)
    with BuildSketch(Plane(origin=(40.425, 0, -31), x_dir=(-1, 0, 0), z_dir=(0, 0, 1))) as fillet4_piece_10a_section:
        with BuildLine():
            CenterArc((FILLET4_R, FILLET4_R), FILLET4_R, 180, 90)
            Line((0, FILLET4_R), (-FILLET4_R * 0.02, FILLET4_R))
            Line((-FILLET4_R * 0.02, FILLET4_R), (-FILLET4_R * 0.02, -FILLET4_R * 0.02))
            Line((-FILLET4_R * 0.02, -FILLET4_R * 0.02), (FILLET4_R, -FILLET4_R * 0.02))
            Line((FILLET4_R, -FILLET4_R * 0.02), (FILLET4_R, 0))
        make_face()
    fillet4_piece_10a = extrude(amount=42, mode=Mode.PRIVATE)
    fillet4_piece_10a = split(fillet4_piece_10a, bisect_by=Plane(origin=(38.613839086, -1.811160914, -27.5), z_dir=(0, 0, 1)), keep=Keep.TOP, mode=Mode.PRIVATE)
    fillet4_piece_10a = split(fillet4_piece_10a, bisect_by=Plane(origin=(38.613839086, -1.811160914, -11), z_dir=(0, 0, -1)), keep=Keep.TOP, mode=Mode.PRIVATE)
    with BuildSketch(Plane(origin=(43.425, 0, -11), x_dir=(0, 0, -1), z_dir=(-1, 0, 0))) as fillet4_piece_10b_section:
        with BuildLine():
            CenterArc((FILLET4_R, FILLET4_R), FILLET4_R, 180, 90)
            Line((0, FILLET4_R), (-FILLET4_R * 0.02, FILLET4_R))
            Line((-FILLET4_R * 0.02, FILLET4_R), (-FILLET4_R * 0.02, -FILLET4_R * 0.02))
            Line((-FILLET4_R * 0.02, -FILLET4_R * 0.02), (FILLET4_R, -FILLET4_R * 0.02))
            Line((FILLET4_R, -FILLET4_R * 0.02), (FILLET4_R, 0))
        make_face()
    fillet4_piece_10b = extrude(amount=23, mode=Mode.PRIVATE)
    fillet4_piece_10b = split(fillet4_piece_10b, bisect_by=Plane(origin=(40.425, -1.811160914, -12.811160914), z_dir=(-1, 0, 0)), keep=Keep.TOP, mode=Mode.PRIVATE)
    fillet4_piece_10 = fillet4_piece_10a & fillet4_piece_10b
    add(fillet4_piece_10)
    with BuildSketch(Plane(origin=(40.425, 0, -11), x_dir=(-1, 0, 0), z_dir=(0, 0, 1))) as fillet4_piece_11a_section:
        with BuildLine():
            CenterArc((FILLET4_R, FILLET4_R), FILLET4_R, 180, 90)
            Line((0, FILLET4_R), (-FILLET4_R * 0.02, FILLET4_R))
            Line((-FILLET4_R * 0.02, FILLET4_R), (-FILLET4_R * 0.02, -FILLET4_R * 0.02))
            Line((-FILLET4_R * 0.02, -FILLET4_R * 0.02), (FILLET4_R, -FILLET4_R * 0.02))
            Line((FILLET4_R, -FILLET4_R * 0.02), (FILLET4_R, 0))
        make_face()
    fillet4_piece_11a = extrude(amount=42, mode=Mode.PRIVATE)
    fillet4_piece_11a = split(fillet4_piece_11a, bisect_by=Plane(origin=(38.613839086, -1.811160914, 27.5), z_dir=(0, 0, -1)), keep=Keep.TOP, mode=Mode.PRIVATE)
    fillet4_piece_11a = split(fillet4_piece_11a, bisect_by=Plane(origin=(38.613839086, -1.811160914, 11), z_dir=(0, 0, 1)), keep=Keep.TOP, mode=Mode.PRIVATE)
    with BuildSketch(Plane(origin=(20.425, 0, 11), x_dir=(0, 0, 1), z_dir=(1, 0, 0))) as fillet4_piece_11b_section:
        with BuildLine():
            CenterArc((FILLET4_R, FILLET4_R), FILLET4_R, 180, 90)
            Line((0, FILLET4_R), (-FILLET4_R * 0.02, FILLET4_R))
            Line((-FILLET4_R * 0.02, FILLET4_R), (-FILLET4_R * 0.02, -FILLET4_R * 0.02))
            Line((-FILLET4_R * 0.02, -FILLET4_R * 0.02), (FILLET4_R, -FILLET4_R * 0.02))
            Line((FILLET4_R, -FILLET4_R * 0.02), (FILLET4_R, 0))
        make_face()
    fillet4_piece_11b = extrude(amount=23, mode=Mode.PRIVATE)
    fillet4_piece_11b = split(fillet4_piece_11b, bisect_by=Plane(origin=(40.425, -1.811160914, 12.811160914), z_dir=(-1, 0, 0)), keep=Keep.TOP, mode=Mode.PRIVATE)
    fillet4_piece_11 = fillet4_piece_11a & fillet4_piece_11b
    add(fillet4_piece_11)
    with BuildSketch(Plane(origin=(63.425, 0, -11), x_dir=(0, 0, -1), z_dir=(-1, 0, 0))) as fillet4_piece_12a_section:
        with BuildLine():
            CenterArc((FILLET4_R, FILLET4_R), FILLET4_R, 180, 90)
            Line((0, FILLET4_R), (-FILLET4_R * 0.02, FILLET4_R))
            Line((-FILLET4_R * 0.02, FILLET4_R), (-FILLET4_R * 0.02, -FILLET4_R * 0.02))
            Line((-FILLET4_R * 0.02, -FILLET4_R * 0.02), (FILLET4_R, -FILLET4_R * 0.02))
            Line((FILLET4_R, -FILLET4_R * 0.02), (FILLET4_R, 0))
        make_face()
    fillet4_piece_12a = extrude(amount=23, mode=Mode.PRIVATE)
    fillet4_piece_12a = split(fillet4_piece_12a, bisect_by=Plane(origin=(50.425, -1.811160914, -12.811160914), z_dir=(-1, 0, 0)), keep=Keep.TOP, mode=Mode.PRIVATE)
    fillet4_piece_12a = split(fillet4_piece_12a, bisect_by=Plane(origin=(43.425, -1.811160914, -12.811160914), z_dir=(1, 0, 0)), keep=Keep.TOP, mode=Mode.PRIVATE)
    with BuildSketch(Plane(origin=(43.425, 0, 11), x_dir=(1, 0, 0), z_dir=(0, 0, -1))) as fillet4_piece_12b_section:
        with BuildLine():
            CenterArc((8, 7.937253933), FILLET4_R, 180, 82.819244219)
            Line((0, 7.937253933), (-0.16, 7.937253933))
            Line((-0.16, 7.937253933), (-0.16, 0))
            Line((-0.16, 0), (0, -0.16))
            ThreePointArc((0, -0.16), (3.5, -0.16), (6.98, -0.158745079))
            Line((6.98, -0.158745079), (7, 0))
        make_face()
    fillet4_piece_12b = extrude(amount=41.843134833, mode=Mode.PRIVATE)
    fillet4_piece_12b = split(fillet4_piece_12b, bisect_by=Plane(origin=(45.12528275, -1.827589543, -27.5), z_dir=(0, 0, 1)), keep=Keep.TOP, mode=Mode.PRIVATE)
    fillet4_piece_12b = split(fillet4_piece_12b, bisect_by=Plane(origin=(45.12528275, -1.827589543, -11), z_dir=(0, 0, -1)), keep=Keep.TOP, mode=Mode.PRIVATE)
    fillet4_piece_12 = fillet4_piece_12a & fillet4_piece_12b
    add(fillet4_piece_12)
    with BuildSketch(Plane(origin=(43.425, 0, 30.843134833), x_dir=(1, 0, 0), z_dir=(0, 0, -1))) as fillet4_piece_13a_section:
        with BuildLine():
            CenterArc((8, 7.937253933), FILLET4_R, 180, 82.819244219)
            Line((0, 7.937253933), (-0.16, 7.937253933))
            Line((-0.16, 7.937253933), (-0.16, 0))
            Line((-0.16, 0), (0, -0.16))
            ThreePointArc((0, -0.16), (3.5, -0.16), (6.98, -0.158745079))
            Line((6.98, -0.158745079), (7, 0))
        make_face()
    fillet4_piece_13a = extrude(amount=41.843134833, mode=Mode.PRIVATE)
    fillet4_piece_13a = split(fillet4_piece_13a, bisect_by=Plane(origin=(45.12528275, -1.827589543, 27.5), z_dir=(0, 0, -1)), keep=Keep.TOP, mode=Mode.PRIVATE)
    fillet4_piece_13a = split(fillet4_piece_13a, bisect_by=Plane(origin=(45.12528275, -1.827589543, 11), z_dir=(0, 0, 1)), keep=Keep.TOP, mode=Mode.PRIVATE)
    with BuildSketch(Plane(origin=(40.425, 0, 11), x_dir=(0, 0, 1), z_dir=(1, 0, 0))) as fillet4_piece_13b_section:
        with BuildLine():
            CenterArc((FILLET4_R, FILLET4_R), FILLET4_R, 180, 90)
            Line((0, FILLET4_R), (-FILLET4_R * 0.02, FILLET4_R))
            Line((-FILLET4_R * 0.02, FILLET4_R), (-FILLET4_R * 0.02, -FILLET4_R * 0.02))
            Line((-FILLET4_R * 0.02, -FILLET4_R * 0.02), (FILLET4_R, -FILLET4_R * 0.02))
            Line((FILLET4_R, -FILLET4_R * 0.02), (FILLET4_R, 0))
        make_face()
    fillet4_piece_13b = extrude(amount=23, mode=Mode.PRIVATE)
    fillet4_piece_13b = split(fillet4_piece_13b, bisect_by=Plane(origin=(50.425, -1.811160914, 12.811160914), z_dir=(-1, 0, 0)), keep=Keep.TOP, mode=Mode.PRIVATE)
    fillet4_piece_13b = split(fillet4_piece_13b, bisect_by=Plane(origin=(43.425, -1.811160914, 12.811160914), z_dir=(1, 0, 0)), keep=Keep.TOP, mode=Mode.PRIVATE)
    fillet4_piece_13 = fillet4_piece_13a & fillet4_piece_13b
    add(fillet4_piece_13)

    # Filete1
    filete1_edges = [part.edges().sort_by_distance(p)[0] for p in [
        (50.425, 1.5, -27.5),
        (-58.475, 1.5, -27.5),
        (-58.475, 1.5, 27.5),
        (50.425, 1.5, 27.5),
    ]]
    fillet(filete1_edges, radius=FILETE1_R)


solid = part.part
